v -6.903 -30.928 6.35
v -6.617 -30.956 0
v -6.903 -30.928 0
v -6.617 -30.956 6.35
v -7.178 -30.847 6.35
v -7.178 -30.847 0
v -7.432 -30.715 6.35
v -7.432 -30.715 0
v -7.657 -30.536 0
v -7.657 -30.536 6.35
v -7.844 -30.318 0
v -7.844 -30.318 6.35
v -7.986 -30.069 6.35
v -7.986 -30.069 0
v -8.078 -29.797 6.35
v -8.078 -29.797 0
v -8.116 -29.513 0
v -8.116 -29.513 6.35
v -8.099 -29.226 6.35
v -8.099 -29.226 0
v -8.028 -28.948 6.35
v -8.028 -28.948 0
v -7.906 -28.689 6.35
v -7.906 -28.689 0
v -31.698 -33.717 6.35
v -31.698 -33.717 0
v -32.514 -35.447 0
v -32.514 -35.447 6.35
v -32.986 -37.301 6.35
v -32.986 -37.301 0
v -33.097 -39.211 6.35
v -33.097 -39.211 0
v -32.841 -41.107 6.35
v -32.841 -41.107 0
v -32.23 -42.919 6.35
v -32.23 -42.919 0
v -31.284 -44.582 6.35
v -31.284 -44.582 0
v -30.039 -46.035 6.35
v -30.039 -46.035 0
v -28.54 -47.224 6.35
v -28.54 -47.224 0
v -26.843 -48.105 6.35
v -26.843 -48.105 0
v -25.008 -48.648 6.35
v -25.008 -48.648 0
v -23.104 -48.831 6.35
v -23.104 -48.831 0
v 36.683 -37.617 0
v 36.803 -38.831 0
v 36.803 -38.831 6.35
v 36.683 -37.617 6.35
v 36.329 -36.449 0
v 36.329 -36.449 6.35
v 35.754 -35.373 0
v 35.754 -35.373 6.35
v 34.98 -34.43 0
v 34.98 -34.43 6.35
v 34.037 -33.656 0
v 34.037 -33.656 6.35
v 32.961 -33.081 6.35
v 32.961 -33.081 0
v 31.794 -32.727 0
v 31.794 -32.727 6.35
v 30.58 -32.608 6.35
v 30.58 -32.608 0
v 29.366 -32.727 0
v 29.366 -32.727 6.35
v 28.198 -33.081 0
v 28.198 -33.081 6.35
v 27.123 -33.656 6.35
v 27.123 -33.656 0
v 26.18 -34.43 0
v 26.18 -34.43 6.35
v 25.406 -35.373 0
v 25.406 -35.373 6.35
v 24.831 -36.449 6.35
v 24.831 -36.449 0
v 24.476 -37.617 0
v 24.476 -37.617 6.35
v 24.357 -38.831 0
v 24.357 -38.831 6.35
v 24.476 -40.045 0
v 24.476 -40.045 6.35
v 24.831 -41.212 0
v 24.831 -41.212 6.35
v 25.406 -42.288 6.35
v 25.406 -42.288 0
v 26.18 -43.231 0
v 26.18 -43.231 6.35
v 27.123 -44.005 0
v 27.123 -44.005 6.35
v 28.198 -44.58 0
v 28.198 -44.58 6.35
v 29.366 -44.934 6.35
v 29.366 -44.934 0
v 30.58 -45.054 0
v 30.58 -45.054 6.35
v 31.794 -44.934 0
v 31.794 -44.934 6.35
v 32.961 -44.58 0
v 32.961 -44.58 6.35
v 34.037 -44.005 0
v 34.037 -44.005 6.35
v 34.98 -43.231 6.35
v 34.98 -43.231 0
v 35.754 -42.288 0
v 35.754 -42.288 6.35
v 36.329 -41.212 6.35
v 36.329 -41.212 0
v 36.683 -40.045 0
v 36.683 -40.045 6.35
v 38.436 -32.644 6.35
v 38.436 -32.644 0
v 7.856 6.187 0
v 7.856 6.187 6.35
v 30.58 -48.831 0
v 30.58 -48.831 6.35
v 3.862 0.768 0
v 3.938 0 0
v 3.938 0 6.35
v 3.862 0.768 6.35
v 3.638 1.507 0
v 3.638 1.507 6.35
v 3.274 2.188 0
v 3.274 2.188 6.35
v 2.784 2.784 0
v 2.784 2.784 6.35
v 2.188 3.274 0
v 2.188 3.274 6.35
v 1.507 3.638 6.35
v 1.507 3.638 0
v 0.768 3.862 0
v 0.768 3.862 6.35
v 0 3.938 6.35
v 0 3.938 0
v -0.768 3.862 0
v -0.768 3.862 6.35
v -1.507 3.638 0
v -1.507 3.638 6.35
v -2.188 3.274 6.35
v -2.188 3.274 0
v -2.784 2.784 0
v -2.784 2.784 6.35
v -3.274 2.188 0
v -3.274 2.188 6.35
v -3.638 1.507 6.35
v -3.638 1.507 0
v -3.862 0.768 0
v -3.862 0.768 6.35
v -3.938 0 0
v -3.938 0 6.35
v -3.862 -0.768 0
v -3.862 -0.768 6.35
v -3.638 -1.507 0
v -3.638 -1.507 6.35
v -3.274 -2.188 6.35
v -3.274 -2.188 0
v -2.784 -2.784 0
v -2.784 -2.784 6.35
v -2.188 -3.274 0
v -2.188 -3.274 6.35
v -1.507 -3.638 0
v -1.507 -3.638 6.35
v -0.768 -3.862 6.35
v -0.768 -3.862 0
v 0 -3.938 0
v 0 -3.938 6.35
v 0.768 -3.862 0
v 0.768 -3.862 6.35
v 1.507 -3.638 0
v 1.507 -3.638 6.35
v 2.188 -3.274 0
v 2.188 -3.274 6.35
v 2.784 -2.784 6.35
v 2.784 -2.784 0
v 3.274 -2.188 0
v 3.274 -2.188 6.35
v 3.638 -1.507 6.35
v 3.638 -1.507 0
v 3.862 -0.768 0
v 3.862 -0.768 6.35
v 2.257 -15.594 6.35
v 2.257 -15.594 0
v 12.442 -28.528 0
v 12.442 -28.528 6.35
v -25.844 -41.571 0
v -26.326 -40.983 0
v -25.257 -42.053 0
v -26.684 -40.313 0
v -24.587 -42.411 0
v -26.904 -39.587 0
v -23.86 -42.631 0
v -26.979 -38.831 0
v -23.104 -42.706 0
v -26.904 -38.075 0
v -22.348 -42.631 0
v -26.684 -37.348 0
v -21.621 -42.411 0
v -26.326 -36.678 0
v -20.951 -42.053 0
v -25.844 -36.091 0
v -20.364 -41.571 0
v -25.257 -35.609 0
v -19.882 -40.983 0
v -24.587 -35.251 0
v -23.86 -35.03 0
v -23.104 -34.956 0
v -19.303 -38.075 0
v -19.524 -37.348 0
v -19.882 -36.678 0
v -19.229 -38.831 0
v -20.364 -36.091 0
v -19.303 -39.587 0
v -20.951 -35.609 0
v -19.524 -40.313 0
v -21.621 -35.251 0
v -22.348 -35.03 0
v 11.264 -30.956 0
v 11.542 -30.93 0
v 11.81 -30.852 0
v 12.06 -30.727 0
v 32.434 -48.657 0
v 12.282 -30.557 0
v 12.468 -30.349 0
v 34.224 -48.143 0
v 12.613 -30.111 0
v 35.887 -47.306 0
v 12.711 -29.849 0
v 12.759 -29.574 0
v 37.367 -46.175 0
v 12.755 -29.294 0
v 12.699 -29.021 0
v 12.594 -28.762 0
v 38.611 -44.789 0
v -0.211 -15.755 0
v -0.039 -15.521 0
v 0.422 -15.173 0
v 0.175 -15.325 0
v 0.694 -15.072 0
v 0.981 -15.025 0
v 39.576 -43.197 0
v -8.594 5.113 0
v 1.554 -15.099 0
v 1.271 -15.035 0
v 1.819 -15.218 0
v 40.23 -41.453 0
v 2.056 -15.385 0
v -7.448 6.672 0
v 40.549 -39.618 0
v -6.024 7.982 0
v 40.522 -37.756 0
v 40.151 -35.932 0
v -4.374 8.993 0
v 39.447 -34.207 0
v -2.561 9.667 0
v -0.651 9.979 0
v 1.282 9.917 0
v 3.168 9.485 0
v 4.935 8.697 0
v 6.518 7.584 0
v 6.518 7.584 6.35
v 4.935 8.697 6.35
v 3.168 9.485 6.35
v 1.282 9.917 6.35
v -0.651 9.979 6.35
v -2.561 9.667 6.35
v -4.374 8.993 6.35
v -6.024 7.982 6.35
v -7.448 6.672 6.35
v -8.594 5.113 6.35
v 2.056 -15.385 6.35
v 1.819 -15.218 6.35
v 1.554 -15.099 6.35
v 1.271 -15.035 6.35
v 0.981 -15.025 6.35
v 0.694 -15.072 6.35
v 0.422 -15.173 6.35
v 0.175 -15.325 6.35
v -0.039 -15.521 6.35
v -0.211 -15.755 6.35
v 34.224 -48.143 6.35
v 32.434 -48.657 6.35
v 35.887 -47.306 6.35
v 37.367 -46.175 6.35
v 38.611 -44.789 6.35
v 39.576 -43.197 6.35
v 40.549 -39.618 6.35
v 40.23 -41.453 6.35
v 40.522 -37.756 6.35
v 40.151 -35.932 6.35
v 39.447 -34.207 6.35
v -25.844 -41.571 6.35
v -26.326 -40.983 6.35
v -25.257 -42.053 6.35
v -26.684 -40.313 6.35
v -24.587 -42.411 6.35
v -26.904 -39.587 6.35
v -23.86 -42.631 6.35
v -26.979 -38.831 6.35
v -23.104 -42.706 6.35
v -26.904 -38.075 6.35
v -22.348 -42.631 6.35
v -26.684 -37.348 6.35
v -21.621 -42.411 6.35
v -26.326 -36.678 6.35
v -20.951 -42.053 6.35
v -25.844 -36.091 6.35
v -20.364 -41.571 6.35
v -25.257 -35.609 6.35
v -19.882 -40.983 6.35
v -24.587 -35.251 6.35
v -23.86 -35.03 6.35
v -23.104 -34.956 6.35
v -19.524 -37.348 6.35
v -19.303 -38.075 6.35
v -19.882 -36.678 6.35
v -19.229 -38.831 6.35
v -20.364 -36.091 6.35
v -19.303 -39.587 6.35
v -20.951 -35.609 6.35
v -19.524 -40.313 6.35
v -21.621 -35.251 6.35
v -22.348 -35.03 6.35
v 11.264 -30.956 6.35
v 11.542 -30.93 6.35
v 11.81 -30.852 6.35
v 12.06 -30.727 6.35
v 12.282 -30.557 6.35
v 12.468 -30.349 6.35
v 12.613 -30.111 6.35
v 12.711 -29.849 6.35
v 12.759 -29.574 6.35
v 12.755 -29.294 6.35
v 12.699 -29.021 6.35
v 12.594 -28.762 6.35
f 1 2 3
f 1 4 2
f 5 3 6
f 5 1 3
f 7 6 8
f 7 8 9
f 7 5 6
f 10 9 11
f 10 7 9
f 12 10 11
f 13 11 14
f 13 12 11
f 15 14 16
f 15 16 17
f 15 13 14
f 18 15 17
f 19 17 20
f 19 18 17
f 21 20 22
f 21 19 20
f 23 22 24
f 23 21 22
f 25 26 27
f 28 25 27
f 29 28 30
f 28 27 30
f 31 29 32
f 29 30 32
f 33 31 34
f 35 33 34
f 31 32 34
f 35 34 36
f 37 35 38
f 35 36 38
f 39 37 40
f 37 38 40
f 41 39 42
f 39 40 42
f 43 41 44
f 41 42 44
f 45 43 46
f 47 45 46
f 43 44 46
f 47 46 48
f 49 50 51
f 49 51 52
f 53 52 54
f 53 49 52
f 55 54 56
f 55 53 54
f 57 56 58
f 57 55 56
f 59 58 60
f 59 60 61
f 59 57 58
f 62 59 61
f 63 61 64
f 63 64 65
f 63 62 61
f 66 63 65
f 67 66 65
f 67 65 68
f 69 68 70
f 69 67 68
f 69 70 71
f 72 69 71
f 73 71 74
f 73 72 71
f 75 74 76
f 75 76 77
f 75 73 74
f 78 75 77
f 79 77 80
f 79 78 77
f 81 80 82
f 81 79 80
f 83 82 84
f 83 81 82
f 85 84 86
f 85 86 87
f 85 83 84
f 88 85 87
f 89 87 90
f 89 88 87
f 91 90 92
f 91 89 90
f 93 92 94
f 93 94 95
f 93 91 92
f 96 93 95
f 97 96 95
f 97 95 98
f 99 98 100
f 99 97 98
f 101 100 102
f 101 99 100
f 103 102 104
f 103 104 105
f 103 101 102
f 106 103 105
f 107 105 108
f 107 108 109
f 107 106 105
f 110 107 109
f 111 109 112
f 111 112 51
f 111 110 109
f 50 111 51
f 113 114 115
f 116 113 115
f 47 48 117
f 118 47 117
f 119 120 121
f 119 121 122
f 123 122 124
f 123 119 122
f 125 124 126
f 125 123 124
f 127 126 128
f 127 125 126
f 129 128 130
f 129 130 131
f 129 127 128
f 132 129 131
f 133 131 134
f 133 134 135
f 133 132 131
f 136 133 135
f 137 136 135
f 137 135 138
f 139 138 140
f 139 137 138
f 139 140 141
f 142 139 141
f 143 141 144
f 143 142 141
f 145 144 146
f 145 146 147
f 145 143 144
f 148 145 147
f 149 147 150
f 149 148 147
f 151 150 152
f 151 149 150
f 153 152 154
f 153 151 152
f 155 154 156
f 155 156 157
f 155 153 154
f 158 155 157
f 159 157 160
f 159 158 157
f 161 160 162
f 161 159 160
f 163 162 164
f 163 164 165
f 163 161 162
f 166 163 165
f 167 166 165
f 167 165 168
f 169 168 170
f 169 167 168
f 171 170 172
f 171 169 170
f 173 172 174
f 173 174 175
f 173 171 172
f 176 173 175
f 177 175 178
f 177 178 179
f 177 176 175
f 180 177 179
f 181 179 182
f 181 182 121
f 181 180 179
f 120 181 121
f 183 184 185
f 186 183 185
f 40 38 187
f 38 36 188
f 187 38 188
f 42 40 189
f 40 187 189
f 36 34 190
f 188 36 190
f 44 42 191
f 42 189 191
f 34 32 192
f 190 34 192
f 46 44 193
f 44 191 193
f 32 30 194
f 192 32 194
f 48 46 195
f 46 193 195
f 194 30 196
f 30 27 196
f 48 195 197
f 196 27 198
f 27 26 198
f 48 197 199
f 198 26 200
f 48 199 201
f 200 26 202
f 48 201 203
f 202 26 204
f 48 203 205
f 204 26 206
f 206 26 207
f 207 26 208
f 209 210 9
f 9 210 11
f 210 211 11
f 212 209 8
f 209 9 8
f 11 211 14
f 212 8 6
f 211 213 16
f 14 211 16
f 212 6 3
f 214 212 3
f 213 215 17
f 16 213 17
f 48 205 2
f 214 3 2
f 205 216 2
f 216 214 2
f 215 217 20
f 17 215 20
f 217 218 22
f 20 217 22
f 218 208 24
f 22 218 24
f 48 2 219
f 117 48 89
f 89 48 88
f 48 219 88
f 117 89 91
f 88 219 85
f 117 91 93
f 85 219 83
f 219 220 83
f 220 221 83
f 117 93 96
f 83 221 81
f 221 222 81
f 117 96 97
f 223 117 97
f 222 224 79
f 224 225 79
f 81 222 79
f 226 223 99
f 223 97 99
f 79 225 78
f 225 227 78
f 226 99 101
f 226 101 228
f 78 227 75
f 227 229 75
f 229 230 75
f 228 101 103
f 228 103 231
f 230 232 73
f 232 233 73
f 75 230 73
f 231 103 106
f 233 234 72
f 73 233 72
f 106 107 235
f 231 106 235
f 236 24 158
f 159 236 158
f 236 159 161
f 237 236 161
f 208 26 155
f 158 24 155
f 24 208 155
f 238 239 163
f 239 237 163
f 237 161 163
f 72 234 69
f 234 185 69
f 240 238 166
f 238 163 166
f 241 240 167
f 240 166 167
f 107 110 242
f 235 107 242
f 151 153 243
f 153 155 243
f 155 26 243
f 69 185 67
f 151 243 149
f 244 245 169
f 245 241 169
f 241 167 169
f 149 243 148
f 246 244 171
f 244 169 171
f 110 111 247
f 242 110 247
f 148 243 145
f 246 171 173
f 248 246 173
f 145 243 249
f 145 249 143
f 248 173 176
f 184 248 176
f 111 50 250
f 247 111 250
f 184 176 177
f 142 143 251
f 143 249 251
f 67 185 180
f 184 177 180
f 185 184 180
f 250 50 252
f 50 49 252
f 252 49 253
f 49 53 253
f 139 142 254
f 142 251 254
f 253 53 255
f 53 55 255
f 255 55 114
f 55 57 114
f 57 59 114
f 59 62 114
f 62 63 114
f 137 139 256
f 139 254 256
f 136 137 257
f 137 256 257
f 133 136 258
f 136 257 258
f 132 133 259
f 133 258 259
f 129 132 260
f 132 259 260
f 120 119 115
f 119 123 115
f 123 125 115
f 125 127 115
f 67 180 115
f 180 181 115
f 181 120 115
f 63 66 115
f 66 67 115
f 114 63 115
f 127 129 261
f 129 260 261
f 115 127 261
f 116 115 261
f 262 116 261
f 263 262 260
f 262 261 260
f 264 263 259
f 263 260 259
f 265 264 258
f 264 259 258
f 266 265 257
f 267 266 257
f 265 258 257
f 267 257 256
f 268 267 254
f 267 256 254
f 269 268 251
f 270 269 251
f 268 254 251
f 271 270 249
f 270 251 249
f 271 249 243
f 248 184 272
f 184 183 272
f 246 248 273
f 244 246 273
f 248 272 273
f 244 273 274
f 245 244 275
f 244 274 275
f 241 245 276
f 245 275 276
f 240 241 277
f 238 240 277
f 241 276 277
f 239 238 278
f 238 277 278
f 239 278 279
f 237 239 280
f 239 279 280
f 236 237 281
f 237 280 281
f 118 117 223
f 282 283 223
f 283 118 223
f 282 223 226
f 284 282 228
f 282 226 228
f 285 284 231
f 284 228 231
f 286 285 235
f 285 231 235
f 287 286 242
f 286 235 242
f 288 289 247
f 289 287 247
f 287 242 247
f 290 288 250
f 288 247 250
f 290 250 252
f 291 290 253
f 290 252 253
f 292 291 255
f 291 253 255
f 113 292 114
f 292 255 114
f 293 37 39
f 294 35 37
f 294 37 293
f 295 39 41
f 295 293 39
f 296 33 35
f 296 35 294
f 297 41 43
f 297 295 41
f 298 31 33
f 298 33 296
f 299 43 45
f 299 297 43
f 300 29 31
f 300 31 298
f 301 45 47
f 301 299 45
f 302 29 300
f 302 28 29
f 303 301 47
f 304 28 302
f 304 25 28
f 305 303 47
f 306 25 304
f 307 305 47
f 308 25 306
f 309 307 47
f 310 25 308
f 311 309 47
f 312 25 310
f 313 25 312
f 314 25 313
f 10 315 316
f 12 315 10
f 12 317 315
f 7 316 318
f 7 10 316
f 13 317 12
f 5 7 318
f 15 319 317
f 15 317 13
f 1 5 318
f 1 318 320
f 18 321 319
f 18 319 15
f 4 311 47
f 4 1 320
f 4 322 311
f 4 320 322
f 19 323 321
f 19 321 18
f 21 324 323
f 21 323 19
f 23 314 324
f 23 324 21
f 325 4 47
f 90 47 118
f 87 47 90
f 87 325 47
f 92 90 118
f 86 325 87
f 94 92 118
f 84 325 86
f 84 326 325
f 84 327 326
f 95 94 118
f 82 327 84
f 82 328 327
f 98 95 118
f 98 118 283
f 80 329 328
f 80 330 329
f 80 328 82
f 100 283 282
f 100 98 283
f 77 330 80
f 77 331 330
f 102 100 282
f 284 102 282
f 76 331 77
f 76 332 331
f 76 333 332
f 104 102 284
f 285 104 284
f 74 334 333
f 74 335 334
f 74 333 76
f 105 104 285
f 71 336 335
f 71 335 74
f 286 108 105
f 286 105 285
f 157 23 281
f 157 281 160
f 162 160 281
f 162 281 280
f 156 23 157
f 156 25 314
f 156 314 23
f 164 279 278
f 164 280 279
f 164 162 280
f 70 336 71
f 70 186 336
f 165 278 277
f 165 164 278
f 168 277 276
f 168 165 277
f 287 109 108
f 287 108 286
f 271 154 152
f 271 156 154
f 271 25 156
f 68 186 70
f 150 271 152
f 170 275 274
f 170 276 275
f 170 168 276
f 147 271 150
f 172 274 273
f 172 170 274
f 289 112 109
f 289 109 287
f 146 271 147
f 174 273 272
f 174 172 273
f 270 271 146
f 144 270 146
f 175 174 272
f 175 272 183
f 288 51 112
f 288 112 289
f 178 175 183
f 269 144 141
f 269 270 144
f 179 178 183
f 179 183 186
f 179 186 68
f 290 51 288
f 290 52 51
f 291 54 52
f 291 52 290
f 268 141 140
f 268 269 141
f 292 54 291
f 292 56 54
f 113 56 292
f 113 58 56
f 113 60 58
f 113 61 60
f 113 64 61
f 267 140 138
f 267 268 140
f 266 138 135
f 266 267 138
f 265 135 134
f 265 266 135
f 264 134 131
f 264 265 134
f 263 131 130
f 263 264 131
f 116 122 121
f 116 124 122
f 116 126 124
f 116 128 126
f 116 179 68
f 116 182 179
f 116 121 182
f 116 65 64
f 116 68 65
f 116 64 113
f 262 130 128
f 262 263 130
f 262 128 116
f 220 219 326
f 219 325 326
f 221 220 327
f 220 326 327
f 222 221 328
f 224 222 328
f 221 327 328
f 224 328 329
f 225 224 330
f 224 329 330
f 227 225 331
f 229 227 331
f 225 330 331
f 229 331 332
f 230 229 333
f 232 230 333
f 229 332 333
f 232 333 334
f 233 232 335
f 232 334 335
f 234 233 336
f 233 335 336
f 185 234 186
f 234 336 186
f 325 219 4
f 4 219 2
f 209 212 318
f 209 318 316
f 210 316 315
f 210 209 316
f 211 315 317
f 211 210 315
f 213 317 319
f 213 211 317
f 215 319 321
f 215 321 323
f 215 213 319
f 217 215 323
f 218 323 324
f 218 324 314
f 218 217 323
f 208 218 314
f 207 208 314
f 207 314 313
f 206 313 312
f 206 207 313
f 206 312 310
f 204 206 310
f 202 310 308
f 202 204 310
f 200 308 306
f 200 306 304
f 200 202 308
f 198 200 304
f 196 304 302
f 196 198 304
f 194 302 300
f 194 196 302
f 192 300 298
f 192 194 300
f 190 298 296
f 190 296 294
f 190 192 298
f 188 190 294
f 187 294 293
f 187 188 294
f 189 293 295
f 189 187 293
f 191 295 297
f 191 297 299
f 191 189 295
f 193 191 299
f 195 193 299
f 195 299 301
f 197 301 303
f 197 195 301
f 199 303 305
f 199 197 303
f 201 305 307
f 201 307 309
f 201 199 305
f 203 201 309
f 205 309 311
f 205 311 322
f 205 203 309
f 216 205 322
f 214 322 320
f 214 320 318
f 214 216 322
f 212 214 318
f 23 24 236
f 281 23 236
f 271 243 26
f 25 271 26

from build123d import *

# Parameters (mm, degrees)
SKETCH1_R           = 10
SKETCH1_R_2         = 3.875
SKETCH1_R_3         = 3.9375
SKETCH1_R_4         = 6.223
BOSS_EXTRUDE1_DEPTH = 6.35
FILLET1_R           = 1.5


with BuildPart() as part:
    # Sketch1 → Boss-Extrude1 (new body)
    # profile 1 of 4: a face of its own
    with BuildSketch(Plane.XY):
        with BuildLine():
            Line((-8.593850937, 5.113289165), (-31.697797638, -33.717269329))
            ThreePointArc((-31.697797638, -33.717269329), (-20.452391437, -29.188501934), (-13.103946701, -38.830558493))
            ThreePointArc((-13.103946701, -38.830558493), (-16.032878889, -45.901626305), (-23.103946701, -48.830558493))
            Line((-23.103946701, -48.830558493), (30.579912659, -48.830558493))
            ThreePointArc((30.579912659, -48.830558493), (21.583526758, -34.464205241), (38.436192426, -32.643566638))
            Line((38.436192426, -32.643566638), (7.856279768, 6.186991855))
            ThreePointArc((7.856279768, 6.186991855), (9.44888347, 3.273927483), (10, 0))
            ThreePointArc((10, 0), (-2.651555264, -9.642056559), (-8.593850937, 5.113289165))
        make_face()
        Polygon((-9.254840748, -30.955558493), (0.905857228, -13.878581033), (14.354349844, -30.955558493), align=None, mode=Mode.SUBTRACT)
    # profile 2 of 4: a face of its own
    with BuildSketch(Plane.XY):
        with Locations((-23.103946701, -38.830558493)):
            Circle(SKETCH1_R)
        with Locations((-23.103946701, -38.830558493)):
            Circle(SKETCH1_R_2, mode=Mode.SUBTRACT)
    # profile 3 of 4: a face of its own
    with BuildSketch(Plane.XY):
        Circle(SKETCH1_R)
        Circle(SKETCH1_R_3, mode=Mode.SUBTRACT)
    # profile 4 of 4: a face of its own
    with BuildSketch(Plane.XY):
        with Locations((30.579912659, -38.830558493)):
            Circle(SKETCH1_R)
        with Locations((30.579912659, -38.830558493)):
            Circle(SKETCH1_R_4, mode=Mode.SUBTRACT)
    extrude(amount=BOSS_EXTRUDE1_DEPTH)

    # Fillet1
    fillet1_edges = [part.edges().sort_by_distance(p)[0] for p in [
        (0.905857228, -13.878581033, 3.175),
        (-9.254840748, -30.955558493, 3.175),
        (14.354349844, -30.955558493, 3.175),
    ]]
    fillet(fillet1_edges, radius=FILLET1_R)


solid = part.part
